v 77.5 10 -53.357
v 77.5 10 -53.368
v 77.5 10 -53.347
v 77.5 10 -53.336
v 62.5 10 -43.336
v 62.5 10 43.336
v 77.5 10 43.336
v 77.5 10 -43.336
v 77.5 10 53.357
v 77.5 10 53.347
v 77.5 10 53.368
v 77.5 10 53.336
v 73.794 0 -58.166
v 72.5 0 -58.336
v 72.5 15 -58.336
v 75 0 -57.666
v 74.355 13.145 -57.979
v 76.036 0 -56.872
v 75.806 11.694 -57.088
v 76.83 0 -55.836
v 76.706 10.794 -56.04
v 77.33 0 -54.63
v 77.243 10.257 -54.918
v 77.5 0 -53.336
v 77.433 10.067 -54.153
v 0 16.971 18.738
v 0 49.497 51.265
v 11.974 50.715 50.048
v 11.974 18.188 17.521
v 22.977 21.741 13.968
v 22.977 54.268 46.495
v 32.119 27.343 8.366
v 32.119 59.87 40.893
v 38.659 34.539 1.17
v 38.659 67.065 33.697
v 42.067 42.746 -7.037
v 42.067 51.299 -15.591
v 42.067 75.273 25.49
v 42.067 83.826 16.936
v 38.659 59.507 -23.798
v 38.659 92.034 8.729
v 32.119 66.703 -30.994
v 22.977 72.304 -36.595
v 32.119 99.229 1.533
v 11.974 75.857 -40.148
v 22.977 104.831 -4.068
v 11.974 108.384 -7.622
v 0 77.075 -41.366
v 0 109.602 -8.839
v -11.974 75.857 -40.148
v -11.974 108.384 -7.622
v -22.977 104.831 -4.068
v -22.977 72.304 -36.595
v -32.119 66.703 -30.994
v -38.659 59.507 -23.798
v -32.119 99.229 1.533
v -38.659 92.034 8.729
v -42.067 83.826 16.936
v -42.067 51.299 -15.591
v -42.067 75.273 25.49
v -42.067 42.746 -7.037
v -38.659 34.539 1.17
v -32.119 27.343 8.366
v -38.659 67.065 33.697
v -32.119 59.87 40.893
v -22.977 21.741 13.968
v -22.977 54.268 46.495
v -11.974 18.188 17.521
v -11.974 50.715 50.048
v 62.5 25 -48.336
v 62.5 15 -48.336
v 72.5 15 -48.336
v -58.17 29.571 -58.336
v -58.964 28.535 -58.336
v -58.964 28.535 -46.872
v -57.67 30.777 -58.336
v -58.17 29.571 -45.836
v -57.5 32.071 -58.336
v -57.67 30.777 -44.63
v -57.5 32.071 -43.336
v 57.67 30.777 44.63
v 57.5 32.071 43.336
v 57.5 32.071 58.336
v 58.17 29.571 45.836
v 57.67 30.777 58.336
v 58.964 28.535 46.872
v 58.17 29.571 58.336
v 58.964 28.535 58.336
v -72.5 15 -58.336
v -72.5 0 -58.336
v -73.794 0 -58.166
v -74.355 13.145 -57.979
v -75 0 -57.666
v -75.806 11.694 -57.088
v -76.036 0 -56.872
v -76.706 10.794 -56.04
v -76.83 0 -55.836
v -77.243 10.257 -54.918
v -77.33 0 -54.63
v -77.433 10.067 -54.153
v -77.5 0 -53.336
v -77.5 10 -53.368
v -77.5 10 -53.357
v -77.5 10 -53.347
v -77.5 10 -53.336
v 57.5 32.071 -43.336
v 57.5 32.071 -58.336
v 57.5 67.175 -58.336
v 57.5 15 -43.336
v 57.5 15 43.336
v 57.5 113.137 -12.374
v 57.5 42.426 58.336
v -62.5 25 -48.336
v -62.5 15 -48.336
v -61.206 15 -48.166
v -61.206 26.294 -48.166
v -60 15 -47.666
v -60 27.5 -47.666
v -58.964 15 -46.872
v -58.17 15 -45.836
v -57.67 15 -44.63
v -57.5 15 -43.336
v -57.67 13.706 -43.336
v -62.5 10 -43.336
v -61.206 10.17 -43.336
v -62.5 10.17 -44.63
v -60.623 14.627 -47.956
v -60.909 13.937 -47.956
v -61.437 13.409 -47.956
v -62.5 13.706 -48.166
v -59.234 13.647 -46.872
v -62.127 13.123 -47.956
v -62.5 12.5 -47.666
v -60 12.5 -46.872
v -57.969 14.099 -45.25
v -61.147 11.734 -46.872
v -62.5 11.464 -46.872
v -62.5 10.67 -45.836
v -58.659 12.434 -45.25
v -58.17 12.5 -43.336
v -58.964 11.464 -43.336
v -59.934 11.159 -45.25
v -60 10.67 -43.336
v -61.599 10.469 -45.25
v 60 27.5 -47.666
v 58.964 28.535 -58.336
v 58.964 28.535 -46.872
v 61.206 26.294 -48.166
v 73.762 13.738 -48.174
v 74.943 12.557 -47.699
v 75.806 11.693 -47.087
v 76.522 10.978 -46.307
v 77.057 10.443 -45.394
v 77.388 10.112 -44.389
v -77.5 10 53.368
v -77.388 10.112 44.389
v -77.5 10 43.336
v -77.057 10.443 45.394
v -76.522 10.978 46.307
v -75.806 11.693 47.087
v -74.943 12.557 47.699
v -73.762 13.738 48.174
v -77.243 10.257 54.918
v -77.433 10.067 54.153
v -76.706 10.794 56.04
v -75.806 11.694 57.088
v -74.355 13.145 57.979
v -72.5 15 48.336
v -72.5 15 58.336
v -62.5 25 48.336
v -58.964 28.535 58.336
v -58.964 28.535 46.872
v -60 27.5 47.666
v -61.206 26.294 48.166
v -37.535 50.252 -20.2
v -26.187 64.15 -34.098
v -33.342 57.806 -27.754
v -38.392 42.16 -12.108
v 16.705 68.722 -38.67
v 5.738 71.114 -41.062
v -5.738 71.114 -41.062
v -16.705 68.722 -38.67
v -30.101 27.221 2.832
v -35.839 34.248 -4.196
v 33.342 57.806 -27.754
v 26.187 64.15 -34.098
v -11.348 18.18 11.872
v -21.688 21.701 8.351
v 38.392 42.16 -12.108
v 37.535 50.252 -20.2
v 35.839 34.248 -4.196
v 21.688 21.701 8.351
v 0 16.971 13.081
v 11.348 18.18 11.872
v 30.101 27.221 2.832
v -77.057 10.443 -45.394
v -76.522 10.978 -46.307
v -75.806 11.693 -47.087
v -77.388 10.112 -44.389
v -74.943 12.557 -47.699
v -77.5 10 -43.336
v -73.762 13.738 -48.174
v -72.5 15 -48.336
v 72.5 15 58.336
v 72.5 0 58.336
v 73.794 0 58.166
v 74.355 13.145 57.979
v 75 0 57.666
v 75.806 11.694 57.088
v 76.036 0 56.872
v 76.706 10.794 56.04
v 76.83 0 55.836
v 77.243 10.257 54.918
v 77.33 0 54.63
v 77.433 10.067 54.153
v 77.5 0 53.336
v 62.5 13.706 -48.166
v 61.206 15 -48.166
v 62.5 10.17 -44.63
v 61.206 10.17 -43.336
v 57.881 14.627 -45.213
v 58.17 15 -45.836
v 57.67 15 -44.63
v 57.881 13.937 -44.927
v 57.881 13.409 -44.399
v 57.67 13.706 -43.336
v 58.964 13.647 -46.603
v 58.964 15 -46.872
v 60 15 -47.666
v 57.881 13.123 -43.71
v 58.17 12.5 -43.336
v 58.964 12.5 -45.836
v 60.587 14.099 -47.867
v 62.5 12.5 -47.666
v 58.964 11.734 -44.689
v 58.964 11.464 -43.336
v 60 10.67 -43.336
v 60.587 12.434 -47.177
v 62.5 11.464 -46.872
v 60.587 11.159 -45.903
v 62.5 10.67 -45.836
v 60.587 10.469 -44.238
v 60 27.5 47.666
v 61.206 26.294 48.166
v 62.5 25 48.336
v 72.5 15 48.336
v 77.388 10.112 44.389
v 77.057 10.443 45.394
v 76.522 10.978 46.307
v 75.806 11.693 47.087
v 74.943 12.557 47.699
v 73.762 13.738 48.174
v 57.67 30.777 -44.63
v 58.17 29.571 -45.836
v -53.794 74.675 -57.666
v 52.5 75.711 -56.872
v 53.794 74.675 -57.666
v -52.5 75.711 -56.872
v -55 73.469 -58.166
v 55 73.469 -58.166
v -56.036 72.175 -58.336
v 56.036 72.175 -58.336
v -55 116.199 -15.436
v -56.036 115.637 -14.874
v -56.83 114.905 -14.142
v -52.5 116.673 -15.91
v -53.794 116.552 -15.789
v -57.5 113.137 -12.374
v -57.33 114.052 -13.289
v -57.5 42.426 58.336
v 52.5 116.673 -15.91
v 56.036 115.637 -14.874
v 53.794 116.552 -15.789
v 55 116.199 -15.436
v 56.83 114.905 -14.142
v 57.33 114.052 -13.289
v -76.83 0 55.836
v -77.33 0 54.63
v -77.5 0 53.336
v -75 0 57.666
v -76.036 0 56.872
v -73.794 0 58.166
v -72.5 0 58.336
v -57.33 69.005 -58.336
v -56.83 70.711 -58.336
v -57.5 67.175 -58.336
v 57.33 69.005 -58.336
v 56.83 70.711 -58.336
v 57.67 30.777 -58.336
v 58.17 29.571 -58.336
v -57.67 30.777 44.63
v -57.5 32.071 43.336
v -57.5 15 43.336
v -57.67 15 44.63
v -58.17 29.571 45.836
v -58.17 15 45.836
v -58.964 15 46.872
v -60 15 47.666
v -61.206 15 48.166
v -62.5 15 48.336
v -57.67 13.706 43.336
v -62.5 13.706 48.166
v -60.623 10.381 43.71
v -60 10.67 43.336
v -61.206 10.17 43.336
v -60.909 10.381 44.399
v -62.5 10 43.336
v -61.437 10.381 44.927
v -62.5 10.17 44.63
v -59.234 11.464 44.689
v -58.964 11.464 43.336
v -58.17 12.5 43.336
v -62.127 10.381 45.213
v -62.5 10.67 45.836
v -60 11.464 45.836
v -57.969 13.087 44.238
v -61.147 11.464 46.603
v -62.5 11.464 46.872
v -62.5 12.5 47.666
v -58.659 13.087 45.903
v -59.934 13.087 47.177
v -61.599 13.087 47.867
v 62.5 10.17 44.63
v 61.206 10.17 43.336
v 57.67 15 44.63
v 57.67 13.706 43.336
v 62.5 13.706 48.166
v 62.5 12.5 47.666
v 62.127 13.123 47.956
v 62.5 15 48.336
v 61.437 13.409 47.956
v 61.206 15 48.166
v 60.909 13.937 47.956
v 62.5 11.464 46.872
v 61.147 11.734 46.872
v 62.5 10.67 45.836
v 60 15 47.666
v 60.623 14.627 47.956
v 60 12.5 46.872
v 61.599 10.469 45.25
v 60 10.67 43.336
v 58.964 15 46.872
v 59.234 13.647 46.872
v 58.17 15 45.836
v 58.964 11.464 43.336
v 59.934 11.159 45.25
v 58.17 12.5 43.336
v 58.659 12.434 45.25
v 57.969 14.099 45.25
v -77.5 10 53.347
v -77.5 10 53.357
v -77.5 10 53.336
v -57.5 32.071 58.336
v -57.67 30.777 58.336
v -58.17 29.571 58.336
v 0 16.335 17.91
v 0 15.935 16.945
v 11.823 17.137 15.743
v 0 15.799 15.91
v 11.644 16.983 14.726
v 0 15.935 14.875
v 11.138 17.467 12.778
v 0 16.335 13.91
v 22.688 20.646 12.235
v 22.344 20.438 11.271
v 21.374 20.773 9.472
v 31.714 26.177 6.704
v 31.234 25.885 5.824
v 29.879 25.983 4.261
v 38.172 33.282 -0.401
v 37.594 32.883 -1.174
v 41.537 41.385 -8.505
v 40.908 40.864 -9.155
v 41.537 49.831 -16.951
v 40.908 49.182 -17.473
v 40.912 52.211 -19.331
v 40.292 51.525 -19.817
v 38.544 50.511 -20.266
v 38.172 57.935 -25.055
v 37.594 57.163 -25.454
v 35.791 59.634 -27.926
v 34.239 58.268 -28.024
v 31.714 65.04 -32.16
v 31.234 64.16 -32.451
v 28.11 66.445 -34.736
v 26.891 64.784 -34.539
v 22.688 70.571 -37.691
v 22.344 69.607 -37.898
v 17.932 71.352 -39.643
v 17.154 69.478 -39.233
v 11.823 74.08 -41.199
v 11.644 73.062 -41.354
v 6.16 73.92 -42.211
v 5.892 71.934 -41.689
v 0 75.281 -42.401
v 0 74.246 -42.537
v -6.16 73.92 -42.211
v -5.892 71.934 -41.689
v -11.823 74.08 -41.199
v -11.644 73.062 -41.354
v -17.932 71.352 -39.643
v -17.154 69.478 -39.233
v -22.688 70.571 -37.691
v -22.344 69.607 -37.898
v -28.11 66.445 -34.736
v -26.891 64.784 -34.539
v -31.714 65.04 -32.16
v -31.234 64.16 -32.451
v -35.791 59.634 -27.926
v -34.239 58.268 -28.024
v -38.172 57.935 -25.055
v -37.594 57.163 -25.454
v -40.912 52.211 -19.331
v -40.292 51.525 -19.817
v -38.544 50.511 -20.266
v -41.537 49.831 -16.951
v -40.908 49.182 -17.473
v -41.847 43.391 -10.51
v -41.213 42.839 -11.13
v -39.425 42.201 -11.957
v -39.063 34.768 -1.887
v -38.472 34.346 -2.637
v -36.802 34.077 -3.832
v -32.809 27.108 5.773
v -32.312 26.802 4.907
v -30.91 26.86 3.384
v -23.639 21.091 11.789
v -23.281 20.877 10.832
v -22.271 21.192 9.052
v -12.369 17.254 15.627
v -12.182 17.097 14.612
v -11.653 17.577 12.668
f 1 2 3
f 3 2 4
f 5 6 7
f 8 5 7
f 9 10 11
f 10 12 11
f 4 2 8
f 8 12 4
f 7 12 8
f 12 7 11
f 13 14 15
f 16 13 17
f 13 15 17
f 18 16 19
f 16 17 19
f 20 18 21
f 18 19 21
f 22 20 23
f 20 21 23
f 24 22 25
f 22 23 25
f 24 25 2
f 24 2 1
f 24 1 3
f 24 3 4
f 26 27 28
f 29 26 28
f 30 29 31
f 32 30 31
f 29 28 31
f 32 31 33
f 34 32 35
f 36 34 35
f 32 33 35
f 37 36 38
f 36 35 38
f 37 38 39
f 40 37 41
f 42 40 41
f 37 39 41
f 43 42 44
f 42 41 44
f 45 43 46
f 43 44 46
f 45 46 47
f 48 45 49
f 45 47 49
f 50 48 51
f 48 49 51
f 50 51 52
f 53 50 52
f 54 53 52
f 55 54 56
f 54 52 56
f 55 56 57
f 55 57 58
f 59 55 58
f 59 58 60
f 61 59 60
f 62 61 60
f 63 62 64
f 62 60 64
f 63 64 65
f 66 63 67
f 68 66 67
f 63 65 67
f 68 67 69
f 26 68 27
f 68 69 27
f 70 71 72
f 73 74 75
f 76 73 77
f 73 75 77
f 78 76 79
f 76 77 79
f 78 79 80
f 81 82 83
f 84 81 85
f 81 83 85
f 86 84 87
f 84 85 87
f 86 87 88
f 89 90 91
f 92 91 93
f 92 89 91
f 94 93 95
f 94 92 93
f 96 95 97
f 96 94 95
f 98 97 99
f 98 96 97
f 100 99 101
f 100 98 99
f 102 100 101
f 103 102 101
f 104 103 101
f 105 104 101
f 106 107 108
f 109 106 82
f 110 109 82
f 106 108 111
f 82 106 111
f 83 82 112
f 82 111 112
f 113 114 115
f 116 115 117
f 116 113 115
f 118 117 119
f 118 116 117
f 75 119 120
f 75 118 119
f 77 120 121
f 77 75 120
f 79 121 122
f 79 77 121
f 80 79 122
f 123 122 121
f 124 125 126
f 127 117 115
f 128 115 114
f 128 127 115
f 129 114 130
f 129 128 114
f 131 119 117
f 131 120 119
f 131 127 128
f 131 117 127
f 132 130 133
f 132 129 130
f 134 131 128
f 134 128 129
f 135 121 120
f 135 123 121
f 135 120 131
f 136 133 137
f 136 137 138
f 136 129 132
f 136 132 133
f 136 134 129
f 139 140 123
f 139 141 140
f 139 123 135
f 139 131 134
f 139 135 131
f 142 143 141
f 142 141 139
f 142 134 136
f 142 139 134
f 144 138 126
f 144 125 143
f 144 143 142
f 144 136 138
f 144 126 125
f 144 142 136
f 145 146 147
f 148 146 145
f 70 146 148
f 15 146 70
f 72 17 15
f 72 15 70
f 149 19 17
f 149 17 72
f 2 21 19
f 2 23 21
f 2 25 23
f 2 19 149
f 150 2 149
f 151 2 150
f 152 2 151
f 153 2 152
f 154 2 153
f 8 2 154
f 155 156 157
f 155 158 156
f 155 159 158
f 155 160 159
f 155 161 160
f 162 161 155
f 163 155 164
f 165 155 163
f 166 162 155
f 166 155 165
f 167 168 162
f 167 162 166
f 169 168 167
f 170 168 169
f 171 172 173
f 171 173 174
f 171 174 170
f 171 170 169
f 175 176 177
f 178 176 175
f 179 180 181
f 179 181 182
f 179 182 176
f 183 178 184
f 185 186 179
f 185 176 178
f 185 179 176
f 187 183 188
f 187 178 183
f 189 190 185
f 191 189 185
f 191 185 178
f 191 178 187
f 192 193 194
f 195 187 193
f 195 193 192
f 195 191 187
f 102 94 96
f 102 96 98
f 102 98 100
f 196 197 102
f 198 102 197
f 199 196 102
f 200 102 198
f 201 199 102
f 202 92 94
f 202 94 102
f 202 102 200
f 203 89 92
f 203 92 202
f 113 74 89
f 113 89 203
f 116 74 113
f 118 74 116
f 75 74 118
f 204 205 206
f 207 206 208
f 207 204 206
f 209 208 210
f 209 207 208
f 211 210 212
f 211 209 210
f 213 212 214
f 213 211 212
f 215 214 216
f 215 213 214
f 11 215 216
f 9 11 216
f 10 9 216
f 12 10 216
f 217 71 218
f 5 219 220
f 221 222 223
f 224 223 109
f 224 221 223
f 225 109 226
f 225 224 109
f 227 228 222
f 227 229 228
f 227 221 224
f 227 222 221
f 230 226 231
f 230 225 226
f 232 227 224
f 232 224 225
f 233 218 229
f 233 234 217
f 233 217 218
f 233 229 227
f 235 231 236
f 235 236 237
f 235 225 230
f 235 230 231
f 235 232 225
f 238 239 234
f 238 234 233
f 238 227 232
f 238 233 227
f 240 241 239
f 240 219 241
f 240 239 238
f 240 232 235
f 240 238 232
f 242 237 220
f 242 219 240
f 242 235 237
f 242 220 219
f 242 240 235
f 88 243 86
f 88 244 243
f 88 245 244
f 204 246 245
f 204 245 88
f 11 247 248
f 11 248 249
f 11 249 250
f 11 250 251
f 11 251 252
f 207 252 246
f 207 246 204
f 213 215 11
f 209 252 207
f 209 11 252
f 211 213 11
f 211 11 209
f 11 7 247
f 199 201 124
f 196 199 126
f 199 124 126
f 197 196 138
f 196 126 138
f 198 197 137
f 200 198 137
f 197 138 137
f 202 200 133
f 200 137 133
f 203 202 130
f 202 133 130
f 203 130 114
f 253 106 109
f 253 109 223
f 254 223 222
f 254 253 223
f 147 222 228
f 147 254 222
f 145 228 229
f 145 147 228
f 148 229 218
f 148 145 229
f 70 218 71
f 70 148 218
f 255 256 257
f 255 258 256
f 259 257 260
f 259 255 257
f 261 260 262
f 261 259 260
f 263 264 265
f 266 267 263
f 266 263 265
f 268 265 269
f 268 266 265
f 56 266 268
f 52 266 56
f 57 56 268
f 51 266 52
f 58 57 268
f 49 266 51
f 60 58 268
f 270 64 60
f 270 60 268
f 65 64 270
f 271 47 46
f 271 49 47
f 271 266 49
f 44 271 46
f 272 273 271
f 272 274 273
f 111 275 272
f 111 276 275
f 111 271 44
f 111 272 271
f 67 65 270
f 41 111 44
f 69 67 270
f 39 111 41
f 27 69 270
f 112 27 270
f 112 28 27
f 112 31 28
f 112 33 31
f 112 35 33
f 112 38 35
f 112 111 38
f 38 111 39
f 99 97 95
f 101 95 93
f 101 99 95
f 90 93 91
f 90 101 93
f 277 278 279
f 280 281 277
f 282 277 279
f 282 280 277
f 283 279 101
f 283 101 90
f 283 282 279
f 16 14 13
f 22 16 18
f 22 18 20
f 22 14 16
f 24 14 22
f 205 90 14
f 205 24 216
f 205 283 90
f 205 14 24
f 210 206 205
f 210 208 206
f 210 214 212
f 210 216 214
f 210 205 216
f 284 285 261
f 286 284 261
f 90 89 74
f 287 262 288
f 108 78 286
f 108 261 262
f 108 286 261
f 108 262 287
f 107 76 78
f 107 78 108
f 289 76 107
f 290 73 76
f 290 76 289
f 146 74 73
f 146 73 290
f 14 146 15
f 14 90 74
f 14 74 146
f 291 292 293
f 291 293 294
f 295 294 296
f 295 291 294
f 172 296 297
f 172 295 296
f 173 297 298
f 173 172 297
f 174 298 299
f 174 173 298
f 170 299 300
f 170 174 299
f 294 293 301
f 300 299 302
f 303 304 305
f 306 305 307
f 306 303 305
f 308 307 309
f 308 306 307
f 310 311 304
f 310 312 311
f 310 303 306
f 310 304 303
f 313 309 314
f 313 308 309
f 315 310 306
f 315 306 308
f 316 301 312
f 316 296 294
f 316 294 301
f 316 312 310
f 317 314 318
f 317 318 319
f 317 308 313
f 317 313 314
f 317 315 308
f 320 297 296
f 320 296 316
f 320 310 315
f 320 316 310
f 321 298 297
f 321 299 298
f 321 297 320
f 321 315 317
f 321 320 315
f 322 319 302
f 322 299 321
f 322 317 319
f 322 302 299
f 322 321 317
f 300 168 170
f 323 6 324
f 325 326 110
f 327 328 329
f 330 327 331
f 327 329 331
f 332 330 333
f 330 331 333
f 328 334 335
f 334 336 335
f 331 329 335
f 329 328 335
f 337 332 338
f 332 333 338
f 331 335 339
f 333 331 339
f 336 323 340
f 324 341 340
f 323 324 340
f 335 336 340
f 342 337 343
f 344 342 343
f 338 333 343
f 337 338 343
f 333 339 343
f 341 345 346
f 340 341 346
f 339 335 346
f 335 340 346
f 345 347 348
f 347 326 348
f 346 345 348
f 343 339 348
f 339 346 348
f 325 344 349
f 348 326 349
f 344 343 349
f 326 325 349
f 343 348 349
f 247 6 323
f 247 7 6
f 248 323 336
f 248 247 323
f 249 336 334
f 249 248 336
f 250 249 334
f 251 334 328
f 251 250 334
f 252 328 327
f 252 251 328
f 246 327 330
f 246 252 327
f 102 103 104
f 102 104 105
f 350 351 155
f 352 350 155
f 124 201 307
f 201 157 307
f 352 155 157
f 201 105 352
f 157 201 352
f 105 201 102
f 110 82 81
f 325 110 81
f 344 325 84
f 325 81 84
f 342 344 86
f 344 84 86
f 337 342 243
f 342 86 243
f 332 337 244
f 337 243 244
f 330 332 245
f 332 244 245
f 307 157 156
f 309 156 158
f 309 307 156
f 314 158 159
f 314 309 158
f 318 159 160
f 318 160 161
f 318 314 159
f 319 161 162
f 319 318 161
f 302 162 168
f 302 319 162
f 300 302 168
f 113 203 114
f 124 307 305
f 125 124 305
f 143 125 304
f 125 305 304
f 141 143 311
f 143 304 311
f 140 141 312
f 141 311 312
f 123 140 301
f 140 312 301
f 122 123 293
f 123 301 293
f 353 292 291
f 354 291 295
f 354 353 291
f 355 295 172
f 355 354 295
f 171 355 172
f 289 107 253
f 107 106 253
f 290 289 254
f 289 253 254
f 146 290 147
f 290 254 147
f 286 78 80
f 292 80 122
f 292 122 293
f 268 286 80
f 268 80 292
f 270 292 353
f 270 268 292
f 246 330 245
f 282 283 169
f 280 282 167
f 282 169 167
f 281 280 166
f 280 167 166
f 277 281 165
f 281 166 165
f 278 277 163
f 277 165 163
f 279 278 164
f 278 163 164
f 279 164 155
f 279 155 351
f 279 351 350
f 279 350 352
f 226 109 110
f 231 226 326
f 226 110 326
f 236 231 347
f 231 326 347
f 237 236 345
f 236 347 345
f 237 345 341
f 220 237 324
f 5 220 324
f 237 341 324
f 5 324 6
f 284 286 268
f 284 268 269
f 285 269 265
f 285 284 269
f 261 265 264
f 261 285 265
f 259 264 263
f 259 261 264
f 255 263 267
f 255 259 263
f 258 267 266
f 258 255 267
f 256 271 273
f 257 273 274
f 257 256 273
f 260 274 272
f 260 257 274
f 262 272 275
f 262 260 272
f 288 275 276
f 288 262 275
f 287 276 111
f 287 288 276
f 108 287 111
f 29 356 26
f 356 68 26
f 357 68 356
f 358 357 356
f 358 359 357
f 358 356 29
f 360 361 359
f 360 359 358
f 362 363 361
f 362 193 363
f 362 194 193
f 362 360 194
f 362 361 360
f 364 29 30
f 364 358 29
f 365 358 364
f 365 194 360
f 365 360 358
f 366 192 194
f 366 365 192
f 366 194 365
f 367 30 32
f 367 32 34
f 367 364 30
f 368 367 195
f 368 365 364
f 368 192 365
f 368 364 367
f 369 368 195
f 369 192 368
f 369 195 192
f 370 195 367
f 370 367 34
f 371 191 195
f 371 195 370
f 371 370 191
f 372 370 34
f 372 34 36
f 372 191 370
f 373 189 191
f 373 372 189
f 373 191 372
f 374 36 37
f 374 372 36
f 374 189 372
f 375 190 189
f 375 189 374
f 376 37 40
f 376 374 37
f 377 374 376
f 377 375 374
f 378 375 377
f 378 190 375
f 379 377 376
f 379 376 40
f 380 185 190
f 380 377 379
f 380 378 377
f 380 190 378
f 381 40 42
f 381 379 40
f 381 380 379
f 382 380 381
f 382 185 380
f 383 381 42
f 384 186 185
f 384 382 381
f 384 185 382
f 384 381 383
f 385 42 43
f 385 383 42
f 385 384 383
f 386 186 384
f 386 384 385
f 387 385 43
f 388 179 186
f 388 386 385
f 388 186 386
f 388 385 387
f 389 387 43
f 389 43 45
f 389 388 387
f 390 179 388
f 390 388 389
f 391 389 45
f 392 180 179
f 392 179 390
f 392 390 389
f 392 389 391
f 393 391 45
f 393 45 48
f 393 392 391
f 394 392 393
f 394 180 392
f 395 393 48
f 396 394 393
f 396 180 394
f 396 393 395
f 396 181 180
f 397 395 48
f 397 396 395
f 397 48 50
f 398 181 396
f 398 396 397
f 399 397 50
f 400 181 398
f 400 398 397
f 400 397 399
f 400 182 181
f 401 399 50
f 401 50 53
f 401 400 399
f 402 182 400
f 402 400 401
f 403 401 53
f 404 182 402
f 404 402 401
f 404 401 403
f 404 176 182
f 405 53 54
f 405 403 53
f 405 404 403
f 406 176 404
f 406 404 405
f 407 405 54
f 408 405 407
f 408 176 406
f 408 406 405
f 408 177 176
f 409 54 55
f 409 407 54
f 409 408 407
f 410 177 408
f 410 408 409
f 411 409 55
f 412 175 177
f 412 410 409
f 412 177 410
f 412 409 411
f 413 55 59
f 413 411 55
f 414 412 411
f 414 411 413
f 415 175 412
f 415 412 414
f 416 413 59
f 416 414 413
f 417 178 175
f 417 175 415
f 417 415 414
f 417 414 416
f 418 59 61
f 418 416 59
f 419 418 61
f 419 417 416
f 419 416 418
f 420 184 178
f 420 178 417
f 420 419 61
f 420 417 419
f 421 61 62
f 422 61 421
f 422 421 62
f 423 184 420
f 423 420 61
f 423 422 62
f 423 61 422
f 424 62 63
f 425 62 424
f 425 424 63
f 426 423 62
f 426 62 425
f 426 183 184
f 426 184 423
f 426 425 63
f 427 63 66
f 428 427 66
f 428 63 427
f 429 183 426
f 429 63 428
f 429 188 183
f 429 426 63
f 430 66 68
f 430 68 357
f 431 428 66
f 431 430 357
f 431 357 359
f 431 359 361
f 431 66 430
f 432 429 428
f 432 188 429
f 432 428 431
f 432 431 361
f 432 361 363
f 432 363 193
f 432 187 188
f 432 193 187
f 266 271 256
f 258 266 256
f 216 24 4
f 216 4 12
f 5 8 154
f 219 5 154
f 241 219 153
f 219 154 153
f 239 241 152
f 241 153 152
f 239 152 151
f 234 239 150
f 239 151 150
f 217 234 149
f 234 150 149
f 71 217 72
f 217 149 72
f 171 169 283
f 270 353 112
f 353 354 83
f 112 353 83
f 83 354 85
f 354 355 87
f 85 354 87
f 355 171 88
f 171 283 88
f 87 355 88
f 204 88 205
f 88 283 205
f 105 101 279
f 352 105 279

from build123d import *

# Parameters (mm, degrees)
BOSS_EXTRU_1_DEPTH      = 57.5
ESQUISSE3_R             = 42.5
ENL_V_MAT_EXTRU_1_DEPTH = 50
ESQUISSE4_W             = 155
ESQUISSE4_H             = 116.672618896
BOSS_EXTRU_2_DEPTH      = 10
CHANFREIN1_SIZE         = 20
ENL_V_MAT_EXTRU_2_REACH = 163.73
ENL_V_START             = -10
ESQUISSE4_3_W           = 20
ESQUISSE4_3_H           = 96.672618896
CONG_3_R                = 5
CONG_1_R                = 4
CONG_2_R                = 5


with BuildPart() as part:
    # Esquisse2 → Boss.-Extru.1 (new, symmetric)
    with BuildSketch(Plane(origin=(0, 0, 0), x_dir=(0, 0, -1), z_dir=(1, 0, 0))):
        Polygon((8.838834765, 109.601551084), (15.909902577, 116.672618896), (58.336309448, 74.246212025), (58.336309448, 0), (-58.336309448, 0), (-58.336309448, 42.426406871), (-51.265241636, 49.497474683), (-15.909902577, 14.142135624), (44.194173824, 74.246212025), align=None)
        Polygon((-51.265241636, 49.497474683), (8.838834765, 109.601551084), (44.194173824, 74.246212025), (-15.909902577, 14.142135624), align=None)
    extrude(amount=BOSS_EXTRU_1_DEPTH, both=True)

    # Esquisse3 → Enlèv. mat.-Extru.1 (cut)
    with BuildSketch(Plane(origin=(0, 50.38135816, 50.38135816), x_dir=(1, 0, 0), z_dir=(0, 0.7071067811865441, 0.7071067811865509))):
        with Locations(Location((0, 41.25, 0), (0, 0, 270))):
            Circle(ESQUISSE3_R)
    extrude(amount=-ENL_V_MAT_EXTRU_1_DEPTH, mode=Mode.SUBTRACT)

    # Esquisse4 → Boss.-Extru.2 (add)
    with BuildSketch(Plane.XZ):
        Rectangle(ESQUISSE4_W, ESQUISSE4_H)
    extrude(amount=-BOSS_EXTRU_2_DEPTH)

    # Chanfrein1
    chanfrein1_edges = [part.edges().sort_by_distance(p)[0] for p in [
        (57.5, 10, 0),
        (-57.5, 10, 0),
    ]]
    chamfer(chanfrein1_edges, length=CHANFREIN1_SIZE - 0.0001)  # a hair under: the kernel refuses the full size

    # Esquisse4<3> → Enlèv. mat.-Extru.2 (cut, up to next)
    with BuildSketch(Plane.XZ.offset(ENL_V_START), mode=Mode.PRIVATE) as enl_v_mat_extru_2_sk1:
        with Locations((-67.5, 0)):
            Rectangle(ESQUISSE4_3_W, ESQUISSE4_3_H)
    enl_v_mat_extru_2_tool1 = extrude(enl_v_mat_extru_2_sk1.sketch, amount=-ENL_V_MAT_EXTRU_2_REACH, mode=Mode.PRIVATE) & part.part
    # Esquisse4<3> → Enlèv. mat.-Extru.2 (cut, up to next)
    with BuildSketch(Plane.XZ.offset(ENL_V_START), mode=Mode.PRIVATE) as enl_v_mat_extru_2_sk2:
        with Locations((67.5, 0)):
            Rectangle(ESQUISSE4_3_W, ESQUISSE4_3_H)
    enl_v_mat_extru_2_tool2 = extrude(enl_v_mat_extru_2_sk2.sketch, amount=-ENL_V_MAT_EXTRU_2_REACH, mode=Mode.PRIVATE) & part.part
    add(enl_v_mat_extru_2_tool1.solids().sort_by_distance((-67.5, 10, 0))[0], mode=Mode.SUBTRACT)
    add(enl_v_mat_extru_2_tool2.solids().sort_by_distance((67.5, 10, 0))[0], mode=Mode.SUBTRACT)

    # Congé3
    cong_3_edges = [part.edges().sort_by_distance(p)[0] for p in [
        (57.5, 29.9999, 53.336309448),
        (-57.5, 29.9999, -53.336309448),
        (-57.5, 29.9999, 53.336309448),
        (57.5, 29.9999, -53.336309448),
        (-57.5, 19.99995, 48.336309448),
        (-57.5, 10, 0),
        (-57.5, 19.99995, -48.336309448),
        (-67.49995, 10, 48.336309448),
        (-67.49995, 10, -48.336309448),
        (67.49995, 10, -48.336309448),
        (57.5, 19.99995, -48.336309448),
        (57.5, 10, 0),
        (67.49995, 10, 48.336309448),
        (57.5, 19.99995, 48.336309448),
    ]]
    fillet(cong_3_edges, radius=CONG_3_R)

    # Congé1
    cong_1_edges = [part.edges().sort_by_distance(p)[0] for p in [
        (0, 74.246212025, -44.194173824),
    ]]
    fillet(cong_1_edges, radius=CONG_1_R)

    # Congé2
    cong_2_edges = [part.edges().sort_by_distance(p)[0] for p in [
        (0, 74.246212025, -58.336309448),
        (57.5, 95.45941546, -37.123106012),
        (-77.5, 5, 58.336309448),
        (-77.5, 5, -58.336309448),
        (77.5, 5, 58.336309448),
        (77.5, 5, -58.336309448),
        (-57.5, 95.45941546, -37.123106012),
    ]]
    fillet(cong_2_edges, radius=CONG_2_R)


solid = part.part
